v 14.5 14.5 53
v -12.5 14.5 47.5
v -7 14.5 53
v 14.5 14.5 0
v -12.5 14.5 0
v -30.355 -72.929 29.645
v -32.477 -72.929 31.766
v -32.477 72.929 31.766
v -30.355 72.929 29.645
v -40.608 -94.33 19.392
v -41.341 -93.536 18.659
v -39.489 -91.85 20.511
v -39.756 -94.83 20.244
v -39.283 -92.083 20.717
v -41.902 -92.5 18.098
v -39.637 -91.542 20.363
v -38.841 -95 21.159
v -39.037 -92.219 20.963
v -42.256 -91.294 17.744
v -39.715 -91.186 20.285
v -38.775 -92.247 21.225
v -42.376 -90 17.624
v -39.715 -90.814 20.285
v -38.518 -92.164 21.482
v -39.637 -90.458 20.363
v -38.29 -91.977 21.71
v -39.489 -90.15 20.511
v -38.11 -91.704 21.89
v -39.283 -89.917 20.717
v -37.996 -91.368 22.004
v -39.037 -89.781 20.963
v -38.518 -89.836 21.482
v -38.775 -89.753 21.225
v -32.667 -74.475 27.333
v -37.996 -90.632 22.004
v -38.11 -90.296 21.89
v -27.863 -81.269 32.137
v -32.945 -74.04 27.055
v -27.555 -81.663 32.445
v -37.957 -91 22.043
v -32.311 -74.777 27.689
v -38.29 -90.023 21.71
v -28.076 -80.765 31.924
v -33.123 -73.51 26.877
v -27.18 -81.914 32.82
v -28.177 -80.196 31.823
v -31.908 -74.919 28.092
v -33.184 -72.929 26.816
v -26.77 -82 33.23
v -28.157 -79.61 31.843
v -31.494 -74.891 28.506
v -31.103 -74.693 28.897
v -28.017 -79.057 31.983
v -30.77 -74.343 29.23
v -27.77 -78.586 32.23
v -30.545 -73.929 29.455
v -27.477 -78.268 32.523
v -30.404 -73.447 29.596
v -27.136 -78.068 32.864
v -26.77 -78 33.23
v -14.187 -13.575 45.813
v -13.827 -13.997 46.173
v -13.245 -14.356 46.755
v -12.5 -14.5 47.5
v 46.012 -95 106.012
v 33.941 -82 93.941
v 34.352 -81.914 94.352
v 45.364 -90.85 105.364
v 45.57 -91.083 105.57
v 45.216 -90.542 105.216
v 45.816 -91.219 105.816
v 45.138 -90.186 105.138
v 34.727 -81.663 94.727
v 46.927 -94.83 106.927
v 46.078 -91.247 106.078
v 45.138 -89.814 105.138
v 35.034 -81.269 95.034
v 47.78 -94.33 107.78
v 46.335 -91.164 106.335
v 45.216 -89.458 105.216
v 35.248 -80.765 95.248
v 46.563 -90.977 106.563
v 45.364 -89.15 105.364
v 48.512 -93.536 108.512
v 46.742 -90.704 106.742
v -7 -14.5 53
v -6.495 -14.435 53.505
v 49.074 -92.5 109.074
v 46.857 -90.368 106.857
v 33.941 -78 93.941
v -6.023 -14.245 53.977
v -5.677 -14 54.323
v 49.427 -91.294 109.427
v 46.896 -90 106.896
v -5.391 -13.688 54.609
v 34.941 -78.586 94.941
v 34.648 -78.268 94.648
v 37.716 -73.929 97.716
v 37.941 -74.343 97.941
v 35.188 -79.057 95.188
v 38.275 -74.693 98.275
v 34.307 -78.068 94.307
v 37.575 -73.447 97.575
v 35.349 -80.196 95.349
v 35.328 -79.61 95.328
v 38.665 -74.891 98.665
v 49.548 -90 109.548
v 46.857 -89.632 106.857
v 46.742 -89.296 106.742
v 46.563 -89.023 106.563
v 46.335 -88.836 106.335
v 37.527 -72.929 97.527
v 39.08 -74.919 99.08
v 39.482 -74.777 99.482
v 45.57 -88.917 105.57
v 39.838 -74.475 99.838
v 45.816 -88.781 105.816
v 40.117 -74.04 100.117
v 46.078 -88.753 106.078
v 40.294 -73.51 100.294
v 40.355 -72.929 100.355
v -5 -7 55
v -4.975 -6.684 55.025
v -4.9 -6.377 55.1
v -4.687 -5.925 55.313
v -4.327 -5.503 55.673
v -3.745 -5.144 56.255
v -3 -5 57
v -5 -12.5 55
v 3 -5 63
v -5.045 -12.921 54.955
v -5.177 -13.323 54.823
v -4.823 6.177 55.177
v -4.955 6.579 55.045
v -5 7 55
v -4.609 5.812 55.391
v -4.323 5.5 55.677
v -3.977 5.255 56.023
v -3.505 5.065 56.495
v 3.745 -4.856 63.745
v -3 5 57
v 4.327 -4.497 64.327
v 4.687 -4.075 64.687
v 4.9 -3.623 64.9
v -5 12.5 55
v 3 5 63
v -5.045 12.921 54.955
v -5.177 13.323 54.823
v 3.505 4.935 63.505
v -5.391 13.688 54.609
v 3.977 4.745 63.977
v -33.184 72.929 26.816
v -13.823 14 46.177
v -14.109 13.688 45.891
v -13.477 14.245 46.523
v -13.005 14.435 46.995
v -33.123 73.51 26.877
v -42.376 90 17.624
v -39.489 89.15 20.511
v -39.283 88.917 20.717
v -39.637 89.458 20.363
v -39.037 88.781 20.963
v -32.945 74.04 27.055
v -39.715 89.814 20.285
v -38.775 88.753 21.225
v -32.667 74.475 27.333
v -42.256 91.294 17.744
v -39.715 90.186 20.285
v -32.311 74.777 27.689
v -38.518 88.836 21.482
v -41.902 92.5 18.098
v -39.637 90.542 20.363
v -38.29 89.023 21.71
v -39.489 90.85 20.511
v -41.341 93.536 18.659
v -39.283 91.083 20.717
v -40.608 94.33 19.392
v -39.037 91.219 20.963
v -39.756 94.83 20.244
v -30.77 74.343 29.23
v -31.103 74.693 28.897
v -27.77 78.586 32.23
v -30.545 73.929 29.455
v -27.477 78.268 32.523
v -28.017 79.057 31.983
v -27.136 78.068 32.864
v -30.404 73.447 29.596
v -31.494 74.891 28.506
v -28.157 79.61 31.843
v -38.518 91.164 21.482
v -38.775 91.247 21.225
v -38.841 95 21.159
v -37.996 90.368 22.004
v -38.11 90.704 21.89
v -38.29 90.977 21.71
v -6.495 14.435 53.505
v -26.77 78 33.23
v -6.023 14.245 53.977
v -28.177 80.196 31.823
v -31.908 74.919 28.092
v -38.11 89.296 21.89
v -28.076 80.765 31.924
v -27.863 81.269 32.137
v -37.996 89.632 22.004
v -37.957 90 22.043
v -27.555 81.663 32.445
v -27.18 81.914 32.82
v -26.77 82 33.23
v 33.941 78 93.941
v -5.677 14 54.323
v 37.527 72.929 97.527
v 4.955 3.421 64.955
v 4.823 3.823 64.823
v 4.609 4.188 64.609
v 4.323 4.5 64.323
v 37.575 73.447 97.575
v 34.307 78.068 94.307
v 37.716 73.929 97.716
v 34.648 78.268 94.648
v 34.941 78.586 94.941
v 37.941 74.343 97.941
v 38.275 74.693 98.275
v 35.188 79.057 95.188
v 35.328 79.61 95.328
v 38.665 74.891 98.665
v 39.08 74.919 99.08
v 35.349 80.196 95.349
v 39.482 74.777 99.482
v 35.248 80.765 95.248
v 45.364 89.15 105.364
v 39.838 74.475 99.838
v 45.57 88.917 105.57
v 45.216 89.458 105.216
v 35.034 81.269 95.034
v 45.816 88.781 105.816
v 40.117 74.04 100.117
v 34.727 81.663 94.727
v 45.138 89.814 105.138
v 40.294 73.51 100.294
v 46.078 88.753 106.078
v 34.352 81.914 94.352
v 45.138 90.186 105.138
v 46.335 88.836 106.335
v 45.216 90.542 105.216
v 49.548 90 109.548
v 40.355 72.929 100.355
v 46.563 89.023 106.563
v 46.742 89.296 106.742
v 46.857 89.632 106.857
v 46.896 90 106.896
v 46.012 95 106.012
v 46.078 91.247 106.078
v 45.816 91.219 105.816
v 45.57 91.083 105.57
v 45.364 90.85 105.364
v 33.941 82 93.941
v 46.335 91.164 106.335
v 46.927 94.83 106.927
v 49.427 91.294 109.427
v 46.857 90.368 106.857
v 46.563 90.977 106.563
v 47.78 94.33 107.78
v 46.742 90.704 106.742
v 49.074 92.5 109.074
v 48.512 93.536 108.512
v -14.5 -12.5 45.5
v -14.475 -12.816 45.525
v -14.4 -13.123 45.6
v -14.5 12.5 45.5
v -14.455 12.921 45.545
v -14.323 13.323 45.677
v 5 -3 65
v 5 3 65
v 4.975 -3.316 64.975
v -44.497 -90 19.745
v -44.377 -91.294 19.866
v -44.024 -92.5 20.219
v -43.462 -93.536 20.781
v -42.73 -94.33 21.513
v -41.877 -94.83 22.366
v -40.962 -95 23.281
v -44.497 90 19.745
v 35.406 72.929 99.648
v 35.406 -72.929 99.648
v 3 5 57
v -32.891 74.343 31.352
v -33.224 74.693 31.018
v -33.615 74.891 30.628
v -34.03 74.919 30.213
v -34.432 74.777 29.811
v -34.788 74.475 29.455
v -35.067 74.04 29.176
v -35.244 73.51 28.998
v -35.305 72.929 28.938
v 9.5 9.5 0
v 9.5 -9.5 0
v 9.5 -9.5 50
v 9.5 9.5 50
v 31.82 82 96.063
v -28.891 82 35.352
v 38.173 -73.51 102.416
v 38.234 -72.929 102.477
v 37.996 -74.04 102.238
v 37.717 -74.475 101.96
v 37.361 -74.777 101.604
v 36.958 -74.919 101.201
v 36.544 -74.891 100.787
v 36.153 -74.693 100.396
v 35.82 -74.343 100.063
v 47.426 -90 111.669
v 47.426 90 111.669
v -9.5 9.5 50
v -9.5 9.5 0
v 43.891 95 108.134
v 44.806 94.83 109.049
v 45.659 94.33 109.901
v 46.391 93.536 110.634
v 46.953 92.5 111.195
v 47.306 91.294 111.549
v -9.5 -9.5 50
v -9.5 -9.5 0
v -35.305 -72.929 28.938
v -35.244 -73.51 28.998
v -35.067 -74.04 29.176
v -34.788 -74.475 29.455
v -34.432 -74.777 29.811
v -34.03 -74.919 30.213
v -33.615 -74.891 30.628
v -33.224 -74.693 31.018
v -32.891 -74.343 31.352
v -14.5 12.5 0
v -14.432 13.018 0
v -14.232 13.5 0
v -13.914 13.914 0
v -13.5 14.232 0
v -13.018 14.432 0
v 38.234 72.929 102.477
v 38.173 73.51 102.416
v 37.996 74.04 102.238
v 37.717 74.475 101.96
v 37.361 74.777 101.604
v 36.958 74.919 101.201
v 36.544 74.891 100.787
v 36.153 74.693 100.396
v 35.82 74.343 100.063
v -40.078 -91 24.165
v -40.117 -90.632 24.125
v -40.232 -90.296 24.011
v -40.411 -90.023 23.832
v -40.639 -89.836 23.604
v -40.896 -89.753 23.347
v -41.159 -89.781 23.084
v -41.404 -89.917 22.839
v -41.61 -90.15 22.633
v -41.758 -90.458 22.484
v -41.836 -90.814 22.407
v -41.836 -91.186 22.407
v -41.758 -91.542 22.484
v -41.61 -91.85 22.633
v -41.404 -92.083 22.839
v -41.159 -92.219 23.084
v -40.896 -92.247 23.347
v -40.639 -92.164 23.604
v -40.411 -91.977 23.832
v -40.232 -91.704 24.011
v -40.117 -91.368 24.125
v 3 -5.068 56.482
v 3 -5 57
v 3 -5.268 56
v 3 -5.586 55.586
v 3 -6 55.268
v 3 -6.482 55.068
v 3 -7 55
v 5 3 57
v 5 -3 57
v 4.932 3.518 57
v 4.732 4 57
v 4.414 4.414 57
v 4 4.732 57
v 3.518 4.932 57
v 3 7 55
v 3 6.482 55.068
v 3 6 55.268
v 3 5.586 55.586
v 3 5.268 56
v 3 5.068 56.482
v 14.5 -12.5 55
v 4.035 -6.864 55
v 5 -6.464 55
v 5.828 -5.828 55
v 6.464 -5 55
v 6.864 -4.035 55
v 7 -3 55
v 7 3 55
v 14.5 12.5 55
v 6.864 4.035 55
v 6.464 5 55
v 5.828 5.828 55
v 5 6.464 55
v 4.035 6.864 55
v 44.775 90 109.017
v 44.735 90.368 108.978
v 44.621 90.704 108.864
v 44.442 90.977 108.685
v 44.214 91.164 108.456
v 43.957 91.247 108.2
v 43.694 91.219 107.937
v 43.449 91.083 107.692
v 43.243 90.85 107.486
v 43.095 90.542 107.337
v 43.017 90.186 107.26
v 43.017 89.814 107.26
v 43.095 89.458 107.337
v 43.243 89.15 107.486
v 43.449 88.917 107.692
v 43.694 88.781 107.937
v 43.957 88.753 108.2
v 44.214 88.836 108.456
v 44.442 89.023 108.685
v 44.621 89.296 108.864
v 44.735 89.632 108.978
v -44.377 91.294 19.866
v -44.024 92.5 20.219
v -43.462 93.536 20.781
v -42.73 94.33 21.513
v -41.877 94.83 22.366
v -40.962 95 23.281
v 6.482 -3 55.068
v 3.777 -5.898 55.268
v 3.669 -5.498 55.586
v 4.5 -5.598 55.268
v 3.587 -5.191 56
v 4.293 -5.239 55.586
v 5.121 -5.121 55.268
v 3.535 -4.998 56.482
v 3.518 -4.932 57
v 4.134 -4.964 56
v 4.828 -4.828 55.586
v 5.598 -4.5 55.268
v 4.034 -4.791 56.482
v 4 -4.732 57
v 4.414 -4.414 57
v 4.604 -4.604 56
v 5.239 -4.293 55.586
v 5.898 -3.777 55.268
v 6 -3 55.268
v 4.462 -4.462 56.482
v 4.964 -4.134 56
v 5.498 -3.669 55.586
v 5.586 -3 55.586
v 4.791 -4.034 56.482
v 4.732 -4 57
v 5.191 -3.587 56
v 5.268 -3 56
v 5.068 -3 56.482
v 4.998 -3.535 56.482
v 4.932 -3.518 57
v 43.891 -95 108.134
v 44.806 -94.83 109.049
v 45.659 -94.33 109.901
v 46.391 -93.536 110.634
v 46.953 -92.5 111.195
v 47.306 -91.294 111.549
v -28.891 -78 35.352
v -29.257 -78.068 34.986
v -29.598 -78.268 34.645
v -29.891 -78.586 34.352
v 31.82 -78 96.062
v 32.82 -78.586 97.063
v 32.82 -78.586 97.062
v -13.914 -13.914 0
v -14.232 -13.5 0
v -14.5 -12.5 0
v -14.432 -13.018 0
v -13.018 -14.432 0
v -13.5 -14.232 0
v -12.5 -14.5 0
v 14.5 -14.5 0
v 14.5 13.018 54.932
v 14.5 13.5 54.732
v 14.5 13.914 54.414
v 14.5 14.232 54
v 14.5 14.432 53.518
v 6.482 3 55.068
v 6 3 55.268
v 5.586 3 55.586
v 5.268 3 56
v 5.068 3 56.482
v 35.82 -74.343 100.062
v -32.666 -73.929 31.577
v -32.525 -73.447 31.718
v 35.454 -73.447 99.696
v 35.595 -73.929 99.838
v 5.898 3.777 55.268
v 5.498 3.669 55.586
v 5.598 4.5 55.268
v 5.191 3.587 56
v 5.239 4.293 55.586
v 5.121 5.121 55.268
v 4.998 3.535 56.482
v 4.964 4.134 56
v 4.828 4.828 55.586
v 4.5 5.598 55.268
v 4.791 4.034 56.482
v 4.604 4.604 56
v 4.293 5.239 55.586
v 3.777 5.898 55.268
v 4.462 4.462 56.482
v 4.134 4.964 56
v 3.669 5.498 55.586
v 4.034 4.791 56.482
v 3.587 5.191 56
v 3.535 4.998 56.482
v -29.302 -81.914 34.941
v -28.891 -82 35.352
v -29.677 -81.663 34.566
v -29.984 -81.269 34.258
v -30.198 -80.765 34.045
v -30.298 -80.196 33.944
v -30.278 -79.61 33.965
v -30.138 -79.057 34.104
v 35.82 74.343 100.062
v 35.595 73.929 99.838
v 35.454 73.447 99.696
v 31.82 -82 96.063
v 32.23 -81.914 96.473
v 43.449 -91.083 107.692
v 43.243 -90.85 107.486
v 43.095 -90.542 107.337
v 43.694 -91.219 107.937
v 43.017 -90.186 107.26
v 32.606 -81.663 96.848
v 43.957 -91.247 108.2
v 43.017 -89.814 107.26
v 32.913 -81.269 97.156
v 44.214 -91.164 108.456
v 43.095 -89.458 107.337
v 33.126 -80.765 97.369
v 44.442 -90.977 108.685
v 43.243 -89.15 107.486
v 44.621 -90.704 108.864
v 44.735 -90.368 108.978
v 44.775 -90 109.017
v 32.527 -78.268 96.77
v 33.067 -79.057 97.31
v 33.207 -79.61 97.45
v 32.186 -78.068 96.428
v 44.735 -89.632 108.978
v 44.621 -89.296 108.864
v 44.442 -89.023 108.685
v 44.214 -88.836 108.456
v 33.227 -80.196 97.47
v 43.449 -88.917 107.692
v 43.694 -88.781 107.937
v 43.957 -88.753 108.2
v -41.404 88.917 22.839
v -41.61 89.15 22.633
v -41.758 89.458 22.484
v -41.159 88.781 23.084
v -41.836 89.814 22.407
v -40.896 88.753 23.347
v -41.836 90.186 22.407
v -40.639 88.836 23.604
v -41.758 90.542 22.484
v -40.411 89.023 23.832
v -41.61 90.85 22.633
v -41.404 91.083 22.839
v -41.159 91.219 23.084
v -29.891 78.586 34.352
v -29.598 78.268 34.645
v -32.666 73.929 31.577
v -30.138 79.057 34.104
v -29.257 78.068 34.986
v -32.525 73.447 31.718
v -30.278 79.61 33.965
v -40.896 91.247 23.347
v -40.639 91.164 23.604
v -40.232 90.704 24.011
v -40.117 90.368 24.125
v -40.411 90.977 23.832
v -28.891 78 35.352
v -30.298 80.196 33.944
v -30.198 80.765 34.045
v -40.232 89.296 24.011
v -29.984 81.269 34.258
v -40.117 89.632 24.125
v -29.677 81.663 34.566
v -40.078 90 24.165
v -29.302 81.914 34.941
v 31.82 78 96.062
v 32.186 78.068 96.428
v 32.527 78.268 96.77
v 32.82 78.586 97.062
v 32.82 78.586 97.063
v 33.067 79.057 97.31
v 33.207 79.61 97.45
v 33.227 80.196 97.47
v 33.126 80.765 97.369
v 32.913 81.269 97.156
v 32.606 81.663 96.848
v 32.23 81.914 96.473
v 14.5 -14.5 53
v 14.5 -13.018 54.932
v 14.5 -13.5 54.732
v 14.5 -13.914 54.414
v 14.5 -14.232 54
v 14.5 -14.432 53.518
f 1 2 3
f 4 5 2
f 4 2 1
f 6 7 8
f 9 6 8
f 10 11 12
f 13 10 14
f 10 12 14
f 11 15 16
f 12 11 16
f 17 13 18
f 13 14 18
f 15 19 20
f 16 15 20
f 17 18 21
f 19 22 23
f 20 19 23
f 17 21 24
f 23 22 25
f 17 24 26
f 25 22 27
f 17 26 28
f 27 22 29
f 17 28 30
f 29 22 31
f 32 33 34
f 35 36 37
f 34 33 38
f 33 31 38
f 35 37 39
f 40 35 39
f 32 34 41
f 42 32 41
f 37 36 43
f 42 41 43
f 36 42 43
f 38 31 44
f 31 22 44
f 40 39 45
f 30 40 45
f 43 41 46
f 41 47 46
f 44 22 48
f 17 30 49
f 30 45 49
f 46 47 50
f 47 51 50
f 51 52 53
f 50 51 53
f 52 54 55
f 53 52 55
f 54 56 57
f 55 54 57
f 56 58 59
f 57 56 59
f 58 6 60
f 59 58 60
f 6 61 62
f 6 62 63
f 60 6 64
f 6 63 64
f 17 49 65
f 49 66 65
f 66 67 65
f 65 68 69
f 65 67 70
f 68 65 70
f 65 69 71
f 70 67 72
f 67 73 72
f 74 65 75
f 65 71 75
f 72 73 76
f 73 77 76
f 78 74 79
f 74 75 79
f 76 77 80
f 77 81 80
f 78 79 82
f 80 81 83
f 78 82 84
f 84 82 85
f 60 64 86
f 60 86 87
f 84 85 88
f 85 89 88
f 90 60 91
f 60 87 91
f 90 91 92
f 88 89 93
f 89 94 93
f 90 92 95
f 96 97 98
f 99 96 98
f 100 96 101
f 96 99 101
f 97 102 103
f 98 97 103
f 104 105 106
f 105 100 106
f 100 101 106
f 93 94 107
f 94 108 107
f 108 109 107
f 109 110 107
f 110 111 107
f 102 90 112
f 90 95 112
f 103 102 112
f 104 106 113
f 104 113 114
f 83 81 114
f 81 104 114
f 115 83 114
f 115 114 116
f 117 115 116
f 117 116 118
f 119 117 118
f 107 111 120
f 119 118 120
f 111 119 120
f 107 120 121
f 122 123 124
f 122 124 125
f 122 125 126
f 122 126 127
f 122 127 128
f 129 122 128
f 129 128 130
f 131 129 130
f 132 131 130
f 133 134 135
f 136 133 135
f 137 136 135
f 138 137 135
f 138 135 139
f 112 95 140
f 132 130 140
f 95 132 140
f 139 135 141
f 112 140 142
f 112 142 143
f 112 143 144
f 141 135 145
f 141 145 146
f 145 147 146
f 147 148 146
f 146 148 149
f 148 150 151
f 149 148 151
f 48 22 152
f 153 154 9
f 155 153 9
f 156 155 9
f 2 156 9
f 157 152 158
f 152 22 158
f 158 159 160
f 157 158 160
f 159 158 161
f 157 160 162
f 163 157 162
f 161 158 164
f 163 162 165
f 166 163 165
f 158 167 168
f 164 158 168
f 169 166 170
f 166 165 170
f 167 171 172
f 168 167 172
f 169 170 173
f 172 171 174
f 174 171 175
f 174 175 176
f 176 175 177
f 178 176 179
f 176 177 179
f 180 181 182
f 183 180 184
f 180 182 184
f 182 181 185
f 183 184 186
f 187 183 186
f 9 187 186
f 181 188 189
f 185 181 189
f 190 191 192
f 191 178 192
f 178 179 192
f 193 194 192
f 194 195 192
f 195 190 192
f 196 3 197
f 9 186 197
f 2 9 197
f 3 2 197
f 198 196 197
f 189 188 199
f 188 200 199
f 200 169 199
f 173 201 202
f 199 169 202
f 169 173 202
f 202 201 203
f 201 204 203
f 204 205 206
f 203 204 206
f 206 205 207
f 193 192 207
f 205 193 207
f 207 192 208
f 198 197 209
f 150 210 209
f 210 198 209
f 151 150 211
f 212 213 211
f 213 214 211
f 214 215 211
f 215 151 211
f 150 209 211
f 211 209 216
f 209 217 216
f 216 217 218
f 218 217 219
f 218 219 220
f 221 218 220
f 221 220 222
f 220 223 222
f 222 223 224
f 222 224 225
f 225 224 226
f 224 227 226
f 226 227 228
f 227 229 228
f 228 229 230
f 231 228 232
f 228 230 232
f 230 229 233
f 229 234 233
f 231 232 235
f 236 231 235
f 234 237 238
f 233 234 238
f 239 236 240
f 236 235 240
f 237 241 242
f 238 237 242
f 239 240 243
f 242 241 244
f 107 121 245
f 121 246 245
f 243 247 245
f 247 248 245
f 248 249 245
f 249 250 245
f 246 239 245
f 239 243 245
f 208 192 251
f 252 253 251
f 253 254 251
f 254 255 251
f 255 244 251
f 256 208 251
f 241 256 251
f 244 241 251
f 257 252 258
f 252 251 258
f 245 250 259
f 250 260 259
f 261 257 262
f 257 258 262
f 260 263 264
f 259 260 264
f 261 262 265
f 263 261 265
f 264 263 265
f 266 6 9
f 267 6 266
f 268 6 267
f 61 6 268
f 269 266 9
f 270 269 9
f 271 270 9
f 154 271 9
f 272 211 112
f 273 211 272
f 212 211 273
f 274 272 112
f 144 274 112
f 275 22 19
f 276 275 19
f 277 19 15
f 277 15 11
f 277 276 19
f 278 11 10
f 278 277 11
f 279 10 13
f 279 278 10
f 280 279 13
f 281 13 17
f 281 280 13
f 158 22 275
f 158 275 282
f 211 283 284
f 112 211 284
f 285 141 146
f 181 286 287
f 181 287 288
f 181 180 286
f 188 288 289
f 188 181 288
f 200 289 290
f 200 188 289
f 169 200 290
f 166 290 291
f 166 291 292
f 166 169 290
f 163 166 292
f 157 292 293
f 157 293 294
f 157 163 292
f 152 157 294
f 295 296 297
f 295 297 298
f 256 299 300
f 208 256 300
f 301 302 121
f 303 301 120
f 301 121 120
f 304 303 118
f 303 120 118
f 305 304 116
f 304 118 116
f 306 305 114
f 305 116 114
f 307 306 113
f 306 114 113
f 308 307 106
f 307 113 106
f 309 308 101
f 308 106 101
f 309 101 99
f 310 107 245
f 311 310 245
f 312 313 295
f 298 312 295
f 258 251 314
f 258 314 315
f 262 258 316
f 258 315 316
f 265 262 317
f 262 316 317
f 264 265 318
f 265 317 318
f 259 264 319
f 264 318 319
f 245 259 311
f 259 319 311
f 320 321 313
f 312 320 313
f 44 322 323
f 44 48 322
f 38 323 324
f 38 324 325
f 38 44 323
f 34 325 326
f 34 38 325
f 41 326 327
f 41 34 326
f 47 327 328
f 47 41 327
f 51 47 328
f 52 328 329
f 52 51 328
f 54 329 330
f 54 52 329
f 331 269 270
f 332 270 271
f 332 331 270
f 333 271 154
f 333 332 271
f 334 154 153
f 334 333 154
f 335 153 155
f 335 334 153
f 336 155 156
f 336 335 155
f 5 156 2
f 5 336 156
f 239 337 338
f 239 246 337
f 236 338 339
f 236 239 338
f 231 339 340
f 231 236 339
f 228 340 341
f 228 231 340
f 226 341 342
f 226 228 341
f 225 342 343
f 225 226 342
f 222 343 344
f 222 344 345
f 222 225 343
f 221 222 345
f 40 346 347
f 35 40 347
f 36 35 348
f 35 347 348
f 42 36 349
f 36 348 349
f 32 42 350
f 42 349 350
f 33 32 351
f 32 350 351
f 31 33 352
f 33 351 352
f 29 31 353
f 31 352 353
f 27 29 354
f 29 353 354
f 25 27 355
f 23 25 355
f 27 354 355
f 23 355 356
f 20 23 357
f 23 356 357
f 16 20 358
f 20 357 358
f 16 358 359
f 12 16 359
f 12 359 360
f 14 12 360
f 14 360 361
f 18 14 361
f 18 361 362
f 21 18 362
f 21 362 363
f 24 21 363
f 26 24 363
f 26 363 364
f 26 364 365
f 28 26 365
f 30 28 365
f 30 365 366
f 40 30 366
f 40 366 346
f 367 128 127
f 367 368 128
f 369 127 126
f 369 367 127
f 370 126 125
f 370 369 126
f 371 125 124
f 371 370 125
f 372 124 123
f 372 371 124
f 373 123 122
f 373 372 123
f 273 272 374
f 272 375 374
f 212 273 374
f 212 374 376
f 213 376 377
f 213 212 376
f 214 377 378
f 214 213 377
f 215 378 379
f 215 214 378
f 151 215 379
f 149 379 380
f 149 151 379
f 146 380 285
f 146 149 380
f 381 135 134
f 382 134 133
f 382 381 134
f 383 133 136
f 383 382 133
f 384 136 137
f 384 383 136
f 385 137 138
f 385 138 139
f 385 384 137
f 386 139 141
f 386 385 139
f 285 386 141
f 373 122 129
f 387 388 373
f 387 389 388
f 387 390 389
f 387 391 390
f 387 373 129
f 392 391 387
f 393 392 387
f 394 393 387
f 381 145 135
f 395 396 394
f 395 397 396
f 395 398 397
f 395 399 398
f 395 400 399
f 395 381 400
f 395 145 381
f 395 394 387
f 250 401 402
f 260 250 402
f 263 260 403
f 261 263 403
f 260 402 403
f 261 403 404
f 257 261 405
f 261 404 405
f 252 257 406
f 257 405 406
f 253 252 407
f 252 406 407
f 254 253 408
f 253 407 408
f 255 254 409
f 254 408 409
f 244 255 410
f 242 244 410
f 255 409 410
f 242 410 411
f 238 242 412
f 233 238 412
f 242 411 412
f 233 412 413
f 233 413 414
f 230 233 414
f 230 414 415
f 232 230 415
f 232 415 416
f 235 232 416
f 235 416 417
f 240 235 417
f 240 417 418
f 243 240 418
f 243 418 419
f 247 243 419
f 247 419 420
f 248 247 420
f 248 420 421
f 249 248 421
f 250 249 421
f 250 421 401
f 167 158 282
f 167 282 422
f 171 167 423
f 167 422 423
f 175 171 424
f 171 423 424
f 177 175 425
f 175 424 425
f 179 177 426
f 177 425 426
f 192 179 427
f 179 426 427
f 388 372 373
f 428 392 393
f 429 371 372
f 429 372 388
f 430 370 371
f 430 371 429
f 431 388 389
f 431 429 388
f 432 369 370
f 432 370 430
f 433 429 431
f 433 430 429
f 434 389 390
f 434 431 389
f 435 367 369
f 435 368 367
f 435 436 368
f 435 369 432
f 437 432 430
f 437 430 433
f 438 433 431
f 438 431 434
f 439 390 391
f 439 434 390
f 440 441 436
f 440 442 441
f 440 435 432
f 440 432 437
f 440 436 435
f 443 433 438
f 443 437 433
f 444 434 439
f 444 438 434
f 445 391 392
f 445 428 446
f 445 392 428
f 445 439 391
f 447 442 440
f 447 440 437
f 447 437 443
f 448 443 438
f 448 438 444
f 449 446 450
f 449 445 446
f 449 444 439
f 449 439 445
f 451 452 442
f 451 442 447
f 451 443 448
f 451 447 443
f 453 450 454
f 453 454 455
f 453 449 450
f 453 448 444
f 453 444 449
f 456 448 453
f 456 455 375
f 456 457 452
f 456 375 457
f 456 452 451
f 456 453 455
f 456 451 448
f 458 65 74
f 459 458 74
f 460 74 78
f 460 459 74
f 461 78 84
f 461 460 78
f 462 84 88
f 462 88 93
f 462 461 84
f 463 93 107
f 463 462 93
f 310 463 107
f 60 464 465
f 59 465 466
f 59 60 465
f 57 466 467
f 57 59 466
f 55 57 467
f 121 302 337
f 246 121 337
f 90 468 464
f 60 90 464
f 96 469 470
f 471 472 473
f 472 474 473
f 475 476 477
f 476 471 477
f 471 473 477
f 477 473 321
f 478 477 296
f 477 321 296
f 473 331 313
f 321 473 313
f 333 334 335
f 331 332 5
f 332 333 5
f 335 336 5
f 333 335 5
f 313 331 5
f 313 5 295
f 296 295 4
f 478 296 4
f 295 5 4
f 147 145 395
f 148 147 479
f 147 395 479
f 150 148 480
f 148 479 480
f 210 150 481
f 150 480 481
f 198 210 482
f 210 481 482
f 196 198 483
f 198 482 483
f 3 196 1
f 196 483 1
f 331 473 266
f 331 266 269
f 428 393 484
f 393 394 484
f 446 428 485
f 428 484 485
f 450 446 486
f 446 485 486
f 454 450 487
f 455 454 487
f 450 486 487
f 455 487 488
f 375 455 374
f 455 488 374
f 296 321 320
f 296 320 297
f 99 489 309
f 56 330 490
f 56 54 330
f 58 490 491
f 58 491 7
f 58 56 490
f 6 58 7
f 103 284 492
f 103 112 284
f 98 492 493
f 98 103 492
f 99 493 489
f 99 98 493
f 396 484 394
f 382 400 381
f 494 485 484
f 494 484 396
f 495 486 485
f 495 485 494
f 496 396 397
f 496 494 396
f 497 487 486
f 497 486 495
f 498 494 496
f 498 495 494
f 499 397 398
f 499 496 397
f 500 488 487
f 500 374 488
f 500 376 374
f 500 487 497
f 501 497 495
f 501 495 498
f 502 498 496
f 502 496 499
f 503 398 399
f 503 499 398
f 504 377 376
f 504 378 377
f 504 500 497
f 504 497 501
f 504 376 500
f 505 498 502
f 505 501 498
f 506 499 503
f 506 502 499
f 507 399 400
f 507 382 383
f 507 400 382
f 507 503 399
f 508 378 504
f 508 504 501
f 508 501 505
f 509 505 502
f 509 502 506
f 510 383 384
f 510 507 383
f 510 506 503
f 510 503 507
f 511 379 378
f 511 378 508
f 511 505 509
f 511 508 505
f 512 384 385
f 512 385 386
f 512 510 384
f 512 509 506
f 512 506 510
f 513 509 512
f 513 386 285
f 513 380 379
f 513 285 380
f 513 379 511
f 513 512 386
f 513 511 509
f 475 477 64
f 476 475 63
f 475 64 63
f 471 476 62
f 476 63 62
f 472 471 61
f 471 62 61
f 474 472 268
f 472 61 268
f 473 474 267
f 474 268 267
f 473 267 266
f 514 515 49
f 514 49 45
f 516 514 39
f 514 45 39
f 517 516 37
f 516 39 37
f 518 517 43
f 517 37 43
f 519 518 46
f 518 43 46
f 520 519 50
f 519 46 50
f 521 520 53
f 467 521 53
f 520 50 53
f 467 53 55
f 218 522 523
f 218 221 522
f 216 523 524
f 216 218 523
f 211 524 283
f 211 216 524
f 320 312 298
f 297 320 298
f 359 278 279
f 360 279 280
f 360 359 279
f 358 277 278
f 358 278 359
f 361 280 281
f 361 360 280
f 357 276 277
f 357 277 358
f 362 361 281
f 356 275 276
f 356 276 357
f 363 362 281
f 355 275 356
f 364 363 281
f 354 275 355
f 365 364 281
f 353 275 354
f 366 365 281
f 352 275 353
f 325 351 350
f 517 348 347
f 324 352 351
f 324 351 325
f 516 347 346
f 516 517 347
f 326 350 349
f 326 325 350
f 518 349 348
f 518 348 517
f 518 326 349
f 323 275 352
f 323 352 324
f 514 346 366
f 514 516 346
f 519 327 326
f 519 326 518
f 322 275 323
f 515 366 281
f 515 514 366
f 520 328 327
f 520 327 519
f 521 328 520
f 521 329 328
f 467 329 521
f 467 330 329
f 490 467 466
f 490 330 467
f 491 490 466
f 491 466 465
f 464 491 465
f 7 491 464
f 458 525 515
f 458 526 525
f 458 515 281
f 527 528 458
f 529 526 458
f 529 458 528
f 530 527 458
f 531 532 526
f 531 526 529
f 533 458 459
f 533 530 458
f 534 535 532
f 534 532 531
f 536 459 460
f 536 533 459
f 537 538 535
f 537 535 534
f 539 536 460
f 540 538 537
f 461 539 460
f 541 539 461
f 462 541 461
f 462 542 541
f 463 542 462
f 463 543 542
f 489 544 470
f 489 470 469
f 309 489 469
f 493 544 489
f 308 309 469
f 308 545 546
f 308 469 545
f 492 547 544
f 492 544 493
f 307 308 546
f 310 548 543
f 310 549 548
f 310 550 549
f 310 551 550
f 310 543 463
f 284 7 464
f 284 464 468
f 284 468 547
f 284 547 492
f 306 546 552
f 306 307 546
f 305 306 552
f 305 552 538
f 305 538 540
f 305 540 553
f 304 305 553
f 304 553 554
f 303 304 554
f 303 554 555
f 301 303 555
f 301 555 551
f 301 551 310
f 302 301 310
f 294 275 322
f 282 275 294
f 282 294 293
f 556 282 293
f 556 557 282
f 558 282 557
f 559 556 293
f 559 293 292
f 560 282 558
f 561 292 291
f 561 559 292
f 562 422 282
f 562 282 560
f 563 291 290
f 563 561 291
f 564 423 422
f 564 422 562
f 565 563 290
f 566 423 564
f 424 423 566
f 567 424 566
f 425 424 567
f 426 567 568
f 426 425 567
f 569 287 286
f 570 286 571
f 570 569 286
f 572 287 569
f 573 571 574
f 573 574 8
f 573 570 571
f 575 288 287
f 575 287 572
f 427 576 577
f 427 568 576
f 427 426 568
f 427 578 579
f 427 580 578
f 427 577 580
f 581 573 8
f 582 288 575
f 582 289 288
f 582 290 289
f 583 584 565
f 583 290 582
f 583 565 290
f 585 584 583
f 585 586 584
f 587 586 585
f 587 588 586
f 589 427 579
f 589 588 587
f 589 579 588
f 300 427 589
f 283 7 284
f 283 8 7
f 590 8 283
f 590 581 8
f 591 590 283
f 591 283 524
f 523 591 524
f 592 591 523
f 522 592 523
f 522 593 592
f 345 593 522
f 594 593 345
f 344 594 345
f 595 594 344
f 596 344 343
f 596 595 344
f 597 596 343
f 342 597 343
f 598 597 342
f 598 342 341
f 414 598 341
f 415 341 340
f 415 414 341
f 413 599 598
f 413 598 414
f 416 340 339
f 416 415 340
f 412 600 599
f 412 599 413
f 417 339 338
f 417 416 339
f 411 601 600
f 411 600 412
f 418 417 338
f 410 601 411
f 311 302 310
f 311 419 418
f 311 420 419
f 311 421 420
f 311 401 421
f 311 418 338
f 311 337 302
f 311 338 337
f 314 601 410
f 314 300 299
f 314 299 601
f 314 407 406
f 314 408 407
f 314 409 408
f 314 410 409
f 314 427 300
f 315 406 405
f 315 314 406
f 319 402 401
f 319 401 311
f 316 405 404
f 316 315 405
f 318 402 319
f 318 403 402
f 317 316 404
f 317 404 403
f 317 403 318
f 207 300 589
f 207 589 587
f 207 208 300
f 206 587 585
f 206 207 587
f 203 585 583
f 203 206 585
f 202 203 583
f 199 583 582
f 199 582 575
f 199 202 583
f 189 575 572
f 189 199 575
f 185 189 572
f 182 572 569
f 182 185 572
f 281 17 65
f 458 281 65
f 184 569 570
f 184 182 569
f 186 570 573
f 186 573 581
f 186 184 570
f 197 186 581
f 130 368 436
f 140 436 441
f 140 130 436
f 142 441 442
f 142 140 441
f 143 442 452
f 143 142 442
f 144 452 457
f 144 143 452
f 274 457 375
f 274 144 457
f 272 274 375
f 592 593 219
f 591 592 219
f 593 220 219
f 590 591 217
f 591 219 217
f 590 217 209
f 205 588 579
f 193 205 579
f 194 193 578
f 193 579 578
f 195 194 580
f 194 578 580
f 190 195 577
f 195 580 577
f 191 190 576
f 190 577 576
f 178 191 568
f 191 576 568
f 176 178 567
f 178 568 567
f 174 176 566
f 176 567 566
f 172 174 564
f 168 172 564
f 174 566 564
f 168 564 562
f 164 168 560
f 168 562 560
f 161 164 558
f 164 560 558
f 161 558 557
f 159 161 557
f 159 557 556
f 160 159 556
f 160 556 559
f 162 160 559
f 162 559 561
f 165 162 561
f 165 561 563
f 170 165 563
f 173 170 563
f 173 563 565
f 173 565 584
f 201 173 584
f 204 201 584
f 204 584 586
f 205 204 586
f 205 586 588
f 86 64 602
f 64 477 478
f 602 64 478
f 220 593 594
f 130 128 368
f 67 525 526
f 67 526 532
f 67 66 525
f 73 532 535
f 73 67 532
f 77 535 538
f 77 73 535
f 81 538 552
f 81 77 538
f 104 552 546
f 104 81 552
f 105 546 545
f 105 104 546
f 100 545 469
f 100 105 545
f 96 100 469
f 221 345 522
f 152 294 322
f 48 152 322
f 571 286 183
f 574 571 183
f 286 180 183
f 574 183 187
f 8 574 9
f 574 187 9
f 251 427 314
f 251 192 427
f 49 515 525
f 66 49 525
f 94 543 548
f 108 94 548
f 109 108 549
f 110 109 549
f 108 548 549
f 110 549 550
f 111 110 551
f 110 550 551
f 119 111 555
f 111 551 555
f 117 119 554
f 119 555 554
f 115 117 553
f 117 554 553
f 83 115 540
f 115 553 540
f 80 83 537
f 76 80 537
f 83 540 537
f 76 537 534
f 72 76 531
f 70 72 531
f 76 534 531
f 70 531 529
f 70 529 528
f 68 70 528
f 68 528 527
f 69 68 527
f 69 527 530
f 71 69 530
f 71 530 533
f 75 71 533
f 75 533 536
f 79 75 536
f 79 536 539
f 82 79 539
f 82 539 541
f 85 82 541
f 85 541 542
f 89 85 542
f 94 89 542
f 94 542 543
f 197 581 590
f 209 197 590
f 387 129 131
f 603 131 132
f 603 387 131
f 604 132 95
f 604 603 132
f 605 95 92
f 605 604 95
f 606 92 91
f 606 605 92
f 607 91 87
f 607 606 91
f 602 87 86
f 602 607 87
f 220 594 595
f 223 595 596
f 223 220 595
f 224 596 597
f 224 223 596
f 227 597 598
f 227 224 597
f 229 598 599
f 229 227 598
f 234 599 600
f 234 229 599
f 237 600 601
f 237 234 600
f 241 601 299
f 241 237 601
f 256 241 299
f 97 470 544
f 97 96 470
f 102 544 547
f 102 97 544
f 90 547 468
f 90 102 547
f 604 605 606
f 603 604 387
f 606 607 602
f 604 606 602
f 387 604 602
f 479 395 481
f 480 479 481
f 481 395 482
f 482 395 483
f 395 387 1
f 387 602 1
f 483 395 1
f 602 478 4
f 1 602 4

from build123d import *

# Parameters (mm, degrees)
SKETCH_1_W          = 29
SKETCH_1_H          = 29
SKETCH_1_W_2        = 19
SKETCH_1_H_2        = 19
EXTRUDE_1_DEPTH     = 50
SKETCH_2_W          = 29
SKETCH_2_H          = 29
EXTRUDE_2_DEPTH     = 5
SKETCH_3_W          = 10
SKETCH_3_H          = 10
EXTRUDE_3_DEPTH     = 10
CUT_EXTRUDE_1_DEPTH = 10
SKETCH_7_W          = 130
SKETCH_7_H          = 190
EXTRUDE_4_DEPTH     = 3
CUT_EXTRUDE_2_DEPTH = 165.058536671
SKETCH_10_R         = 1.25
CUT_EXTRUDE_3_DEPTH = 149.400384885
CUT_EXTRUDE_9_DEPTH = 3
FILLET_1_R          = 2
FILLET_3_R          = 5


with BuildPart() as part:
    # 草图1 → 凸台-拉伸1 (new body)
    with BuildSketch(Plane.XY):
        Rectangle(SKETCH_1_W, SKETCH_1_H)
        Rectangle(SKETCH_1_W_2, SKETCH_1_H_2, mode=Mode.SUBTRACT)
    extrude(amount=EXTRUDE_1_DEPTH)

    # 草图2 → 凸台-拉伸2 (add)
    with BuildSketch(Plane.XY.offset(50)):
        Rectangle(SKETCH_2_W, SKETCH_2_H)
    extrude(amount=EXTRUDE_2_DEPTH)

    # 草图3 → 凸台-拉伸3 (add)
    with BuildSketch(Plane.XY.offset(55)):
        Rectangle(SKETCH_3_W, SKETCH_3_H)
    extrude(amount=EXTRUDE_3_DEPTH)

    # 草图4 → 切除-拉伸1 (cut)
    with BuildSketch(Plane(origin=(0, 5, 0), x_dir=(1, 0, 0), z_dir=(0, 1, 0))):
        Polygon((-5, -55), (5, -65), (-5, -65), align=None)
    extrude(amount=-CUT_EXTRUDE_1_DEPTH, mode=Mode.SUBTRACT)

    # 草图7 → 凸台-拉伸4 (add)
    with BuildSketch(Plane(origin=(-30, 0, 30), x_dir=(0.7071067811865475, 0, 0.7071067811865476), z_dir=(-0.7071067811865476, 0, 0.7071067811865475))):
        with Locations((47.497474683, 0)):
            Rectangle(SKETCH_7_W, SKETCH_7_H)
    extrude(amount=EXTRUDE_4_DEPTH)

    # 草图8 → 切除-拉伸2 (cut, through all)
    with BuildSketch(Plane.XZ.offset(14.5)):
        Polygon((-14.5, 55), (-14.5, 49.742640687), (-9.242640687, 55), align=None)
    extrude(amount=-CUT_EXTRUDE_2_DEPTH, mode=Mode.SUBTRACT)

    # 草图10 → 切除-拉伸3 (cut, through all)
    with BuildSketch(Plane(origin=(-32.121320344, 0, 32.121320344), x_dir=(0.7071067811865475, 0, 0.7071067811865476), z_dir=(-0.7071067811865476, 0, 0.7071067811865475))):
        with Locations((107.497474683, 90)):
            Circle(SKETCH_10_R)
        with Locations((-12.502525317, 90)):
            Circle(SKETCH_10_R)
        with Locations((-12.502525317, -91)):
            Circle(SKETCH_10_R)
        with Locations((107.497474683, -90)):
            Circle(SKETCH_10_R)
    extrude(amount=-CUT_EXTRUDE_3_DEPTH, mode=Mode.SUBTRACT)

    # 草图11 → 切除-拉伸9 (cut)
    with BuildSketch(Plane(origin=(-32.121320344, 0, 32.121320344), x_dir=(0.7071067811865475, 0, 0.7071067811865476), z_dir=(-0.7071067811865476, 0, 0.7071067811865475))):
        Polygon((-0.25988463, -82), (95.254833996, -82), (91.254833996, -78), (3.74011537, -78), align=None)
        Polygon((99.497474683, -77.757359313), (99.497474683, 77.757359313), (95.497474683, 73.757359313), (95.497474683, -73.757359313), align=None)
        Polygon((-0.502525317, 73.757359313), (-4.502525317, 77.757359313), (-4.502525317, -77.757359313), (-0.502525317, -73.757359313), align=None)
        Polygon((91.254833996, 78), (95.254833996, 82), (-0.25988463, 82), (3.74011537, 78), align=None)
    extrude(amount=-CUT_EXTRUDE_9_DEPTH, mode=Mode.SUBTRACT)

    # 圆角1
    fillet_1_edges = [part.edges().sort_by_distance(p)[0] for p in [
        (5, 0, 55),
        (0, 5, 55),
        (5, 5, 60),
        (5, -5, 60),
        (0, -5, 55),
        (4.75, -14.5, 55),
        (-14.5, -14.5, 22.75),
        (-14.5, 14.5, 22.75),
        (4.75, 14.5, 55),
        (-28.415999231, 78, 33.705321112),
        (-31.244426356, 82, 30.876893988),
        (36.294678888, 82, 98.415999231),
        (33.466251763, 78, 95.587572106),
        (-31.415999231, -73.757359313, 30.705321112),
        (-34.244426356, -77.757359313, 27.876893988),
        (-34.244426356, 77.757359313, 27.876893988),
        (-31.415999231, 73.757359313, 30.705321112),
        (36.466251763, 73.757359313, 98.587572106),
        (39.294678888, 77.757359313, 101.415999231),
        (39.294678888, -77.757359313, 101.415999231),
        (36.466251763, -73.757359313, 98.587572106),
        (33.466251763, -78, 95.587572106),
        (-31.244426356, -82, 30.876893988),
        (-28.415999231, -78, 33.705321112),
        (36.294678888, -82, 98.415999231),
    ]]
    fillet(fillet_1_edges, radius=FILLET_1_R - 0.0001)  # a hair under: the kernel refuses the full size

    # 圆角3
    fillet_3_edges = [part.edges().sort_by_distance(p)[0] for p in [
        (-43.436814511, 95, 18.684505832),
        (-43.436814511, -95, 18.684505832),
        (48.487067043, -95, 110.608387387),
        (48.487067043, 95, 110.608387387),
    ]]
    fillet(fillet_3_edges, radius=FILLET_3_R)


solid = part.part
